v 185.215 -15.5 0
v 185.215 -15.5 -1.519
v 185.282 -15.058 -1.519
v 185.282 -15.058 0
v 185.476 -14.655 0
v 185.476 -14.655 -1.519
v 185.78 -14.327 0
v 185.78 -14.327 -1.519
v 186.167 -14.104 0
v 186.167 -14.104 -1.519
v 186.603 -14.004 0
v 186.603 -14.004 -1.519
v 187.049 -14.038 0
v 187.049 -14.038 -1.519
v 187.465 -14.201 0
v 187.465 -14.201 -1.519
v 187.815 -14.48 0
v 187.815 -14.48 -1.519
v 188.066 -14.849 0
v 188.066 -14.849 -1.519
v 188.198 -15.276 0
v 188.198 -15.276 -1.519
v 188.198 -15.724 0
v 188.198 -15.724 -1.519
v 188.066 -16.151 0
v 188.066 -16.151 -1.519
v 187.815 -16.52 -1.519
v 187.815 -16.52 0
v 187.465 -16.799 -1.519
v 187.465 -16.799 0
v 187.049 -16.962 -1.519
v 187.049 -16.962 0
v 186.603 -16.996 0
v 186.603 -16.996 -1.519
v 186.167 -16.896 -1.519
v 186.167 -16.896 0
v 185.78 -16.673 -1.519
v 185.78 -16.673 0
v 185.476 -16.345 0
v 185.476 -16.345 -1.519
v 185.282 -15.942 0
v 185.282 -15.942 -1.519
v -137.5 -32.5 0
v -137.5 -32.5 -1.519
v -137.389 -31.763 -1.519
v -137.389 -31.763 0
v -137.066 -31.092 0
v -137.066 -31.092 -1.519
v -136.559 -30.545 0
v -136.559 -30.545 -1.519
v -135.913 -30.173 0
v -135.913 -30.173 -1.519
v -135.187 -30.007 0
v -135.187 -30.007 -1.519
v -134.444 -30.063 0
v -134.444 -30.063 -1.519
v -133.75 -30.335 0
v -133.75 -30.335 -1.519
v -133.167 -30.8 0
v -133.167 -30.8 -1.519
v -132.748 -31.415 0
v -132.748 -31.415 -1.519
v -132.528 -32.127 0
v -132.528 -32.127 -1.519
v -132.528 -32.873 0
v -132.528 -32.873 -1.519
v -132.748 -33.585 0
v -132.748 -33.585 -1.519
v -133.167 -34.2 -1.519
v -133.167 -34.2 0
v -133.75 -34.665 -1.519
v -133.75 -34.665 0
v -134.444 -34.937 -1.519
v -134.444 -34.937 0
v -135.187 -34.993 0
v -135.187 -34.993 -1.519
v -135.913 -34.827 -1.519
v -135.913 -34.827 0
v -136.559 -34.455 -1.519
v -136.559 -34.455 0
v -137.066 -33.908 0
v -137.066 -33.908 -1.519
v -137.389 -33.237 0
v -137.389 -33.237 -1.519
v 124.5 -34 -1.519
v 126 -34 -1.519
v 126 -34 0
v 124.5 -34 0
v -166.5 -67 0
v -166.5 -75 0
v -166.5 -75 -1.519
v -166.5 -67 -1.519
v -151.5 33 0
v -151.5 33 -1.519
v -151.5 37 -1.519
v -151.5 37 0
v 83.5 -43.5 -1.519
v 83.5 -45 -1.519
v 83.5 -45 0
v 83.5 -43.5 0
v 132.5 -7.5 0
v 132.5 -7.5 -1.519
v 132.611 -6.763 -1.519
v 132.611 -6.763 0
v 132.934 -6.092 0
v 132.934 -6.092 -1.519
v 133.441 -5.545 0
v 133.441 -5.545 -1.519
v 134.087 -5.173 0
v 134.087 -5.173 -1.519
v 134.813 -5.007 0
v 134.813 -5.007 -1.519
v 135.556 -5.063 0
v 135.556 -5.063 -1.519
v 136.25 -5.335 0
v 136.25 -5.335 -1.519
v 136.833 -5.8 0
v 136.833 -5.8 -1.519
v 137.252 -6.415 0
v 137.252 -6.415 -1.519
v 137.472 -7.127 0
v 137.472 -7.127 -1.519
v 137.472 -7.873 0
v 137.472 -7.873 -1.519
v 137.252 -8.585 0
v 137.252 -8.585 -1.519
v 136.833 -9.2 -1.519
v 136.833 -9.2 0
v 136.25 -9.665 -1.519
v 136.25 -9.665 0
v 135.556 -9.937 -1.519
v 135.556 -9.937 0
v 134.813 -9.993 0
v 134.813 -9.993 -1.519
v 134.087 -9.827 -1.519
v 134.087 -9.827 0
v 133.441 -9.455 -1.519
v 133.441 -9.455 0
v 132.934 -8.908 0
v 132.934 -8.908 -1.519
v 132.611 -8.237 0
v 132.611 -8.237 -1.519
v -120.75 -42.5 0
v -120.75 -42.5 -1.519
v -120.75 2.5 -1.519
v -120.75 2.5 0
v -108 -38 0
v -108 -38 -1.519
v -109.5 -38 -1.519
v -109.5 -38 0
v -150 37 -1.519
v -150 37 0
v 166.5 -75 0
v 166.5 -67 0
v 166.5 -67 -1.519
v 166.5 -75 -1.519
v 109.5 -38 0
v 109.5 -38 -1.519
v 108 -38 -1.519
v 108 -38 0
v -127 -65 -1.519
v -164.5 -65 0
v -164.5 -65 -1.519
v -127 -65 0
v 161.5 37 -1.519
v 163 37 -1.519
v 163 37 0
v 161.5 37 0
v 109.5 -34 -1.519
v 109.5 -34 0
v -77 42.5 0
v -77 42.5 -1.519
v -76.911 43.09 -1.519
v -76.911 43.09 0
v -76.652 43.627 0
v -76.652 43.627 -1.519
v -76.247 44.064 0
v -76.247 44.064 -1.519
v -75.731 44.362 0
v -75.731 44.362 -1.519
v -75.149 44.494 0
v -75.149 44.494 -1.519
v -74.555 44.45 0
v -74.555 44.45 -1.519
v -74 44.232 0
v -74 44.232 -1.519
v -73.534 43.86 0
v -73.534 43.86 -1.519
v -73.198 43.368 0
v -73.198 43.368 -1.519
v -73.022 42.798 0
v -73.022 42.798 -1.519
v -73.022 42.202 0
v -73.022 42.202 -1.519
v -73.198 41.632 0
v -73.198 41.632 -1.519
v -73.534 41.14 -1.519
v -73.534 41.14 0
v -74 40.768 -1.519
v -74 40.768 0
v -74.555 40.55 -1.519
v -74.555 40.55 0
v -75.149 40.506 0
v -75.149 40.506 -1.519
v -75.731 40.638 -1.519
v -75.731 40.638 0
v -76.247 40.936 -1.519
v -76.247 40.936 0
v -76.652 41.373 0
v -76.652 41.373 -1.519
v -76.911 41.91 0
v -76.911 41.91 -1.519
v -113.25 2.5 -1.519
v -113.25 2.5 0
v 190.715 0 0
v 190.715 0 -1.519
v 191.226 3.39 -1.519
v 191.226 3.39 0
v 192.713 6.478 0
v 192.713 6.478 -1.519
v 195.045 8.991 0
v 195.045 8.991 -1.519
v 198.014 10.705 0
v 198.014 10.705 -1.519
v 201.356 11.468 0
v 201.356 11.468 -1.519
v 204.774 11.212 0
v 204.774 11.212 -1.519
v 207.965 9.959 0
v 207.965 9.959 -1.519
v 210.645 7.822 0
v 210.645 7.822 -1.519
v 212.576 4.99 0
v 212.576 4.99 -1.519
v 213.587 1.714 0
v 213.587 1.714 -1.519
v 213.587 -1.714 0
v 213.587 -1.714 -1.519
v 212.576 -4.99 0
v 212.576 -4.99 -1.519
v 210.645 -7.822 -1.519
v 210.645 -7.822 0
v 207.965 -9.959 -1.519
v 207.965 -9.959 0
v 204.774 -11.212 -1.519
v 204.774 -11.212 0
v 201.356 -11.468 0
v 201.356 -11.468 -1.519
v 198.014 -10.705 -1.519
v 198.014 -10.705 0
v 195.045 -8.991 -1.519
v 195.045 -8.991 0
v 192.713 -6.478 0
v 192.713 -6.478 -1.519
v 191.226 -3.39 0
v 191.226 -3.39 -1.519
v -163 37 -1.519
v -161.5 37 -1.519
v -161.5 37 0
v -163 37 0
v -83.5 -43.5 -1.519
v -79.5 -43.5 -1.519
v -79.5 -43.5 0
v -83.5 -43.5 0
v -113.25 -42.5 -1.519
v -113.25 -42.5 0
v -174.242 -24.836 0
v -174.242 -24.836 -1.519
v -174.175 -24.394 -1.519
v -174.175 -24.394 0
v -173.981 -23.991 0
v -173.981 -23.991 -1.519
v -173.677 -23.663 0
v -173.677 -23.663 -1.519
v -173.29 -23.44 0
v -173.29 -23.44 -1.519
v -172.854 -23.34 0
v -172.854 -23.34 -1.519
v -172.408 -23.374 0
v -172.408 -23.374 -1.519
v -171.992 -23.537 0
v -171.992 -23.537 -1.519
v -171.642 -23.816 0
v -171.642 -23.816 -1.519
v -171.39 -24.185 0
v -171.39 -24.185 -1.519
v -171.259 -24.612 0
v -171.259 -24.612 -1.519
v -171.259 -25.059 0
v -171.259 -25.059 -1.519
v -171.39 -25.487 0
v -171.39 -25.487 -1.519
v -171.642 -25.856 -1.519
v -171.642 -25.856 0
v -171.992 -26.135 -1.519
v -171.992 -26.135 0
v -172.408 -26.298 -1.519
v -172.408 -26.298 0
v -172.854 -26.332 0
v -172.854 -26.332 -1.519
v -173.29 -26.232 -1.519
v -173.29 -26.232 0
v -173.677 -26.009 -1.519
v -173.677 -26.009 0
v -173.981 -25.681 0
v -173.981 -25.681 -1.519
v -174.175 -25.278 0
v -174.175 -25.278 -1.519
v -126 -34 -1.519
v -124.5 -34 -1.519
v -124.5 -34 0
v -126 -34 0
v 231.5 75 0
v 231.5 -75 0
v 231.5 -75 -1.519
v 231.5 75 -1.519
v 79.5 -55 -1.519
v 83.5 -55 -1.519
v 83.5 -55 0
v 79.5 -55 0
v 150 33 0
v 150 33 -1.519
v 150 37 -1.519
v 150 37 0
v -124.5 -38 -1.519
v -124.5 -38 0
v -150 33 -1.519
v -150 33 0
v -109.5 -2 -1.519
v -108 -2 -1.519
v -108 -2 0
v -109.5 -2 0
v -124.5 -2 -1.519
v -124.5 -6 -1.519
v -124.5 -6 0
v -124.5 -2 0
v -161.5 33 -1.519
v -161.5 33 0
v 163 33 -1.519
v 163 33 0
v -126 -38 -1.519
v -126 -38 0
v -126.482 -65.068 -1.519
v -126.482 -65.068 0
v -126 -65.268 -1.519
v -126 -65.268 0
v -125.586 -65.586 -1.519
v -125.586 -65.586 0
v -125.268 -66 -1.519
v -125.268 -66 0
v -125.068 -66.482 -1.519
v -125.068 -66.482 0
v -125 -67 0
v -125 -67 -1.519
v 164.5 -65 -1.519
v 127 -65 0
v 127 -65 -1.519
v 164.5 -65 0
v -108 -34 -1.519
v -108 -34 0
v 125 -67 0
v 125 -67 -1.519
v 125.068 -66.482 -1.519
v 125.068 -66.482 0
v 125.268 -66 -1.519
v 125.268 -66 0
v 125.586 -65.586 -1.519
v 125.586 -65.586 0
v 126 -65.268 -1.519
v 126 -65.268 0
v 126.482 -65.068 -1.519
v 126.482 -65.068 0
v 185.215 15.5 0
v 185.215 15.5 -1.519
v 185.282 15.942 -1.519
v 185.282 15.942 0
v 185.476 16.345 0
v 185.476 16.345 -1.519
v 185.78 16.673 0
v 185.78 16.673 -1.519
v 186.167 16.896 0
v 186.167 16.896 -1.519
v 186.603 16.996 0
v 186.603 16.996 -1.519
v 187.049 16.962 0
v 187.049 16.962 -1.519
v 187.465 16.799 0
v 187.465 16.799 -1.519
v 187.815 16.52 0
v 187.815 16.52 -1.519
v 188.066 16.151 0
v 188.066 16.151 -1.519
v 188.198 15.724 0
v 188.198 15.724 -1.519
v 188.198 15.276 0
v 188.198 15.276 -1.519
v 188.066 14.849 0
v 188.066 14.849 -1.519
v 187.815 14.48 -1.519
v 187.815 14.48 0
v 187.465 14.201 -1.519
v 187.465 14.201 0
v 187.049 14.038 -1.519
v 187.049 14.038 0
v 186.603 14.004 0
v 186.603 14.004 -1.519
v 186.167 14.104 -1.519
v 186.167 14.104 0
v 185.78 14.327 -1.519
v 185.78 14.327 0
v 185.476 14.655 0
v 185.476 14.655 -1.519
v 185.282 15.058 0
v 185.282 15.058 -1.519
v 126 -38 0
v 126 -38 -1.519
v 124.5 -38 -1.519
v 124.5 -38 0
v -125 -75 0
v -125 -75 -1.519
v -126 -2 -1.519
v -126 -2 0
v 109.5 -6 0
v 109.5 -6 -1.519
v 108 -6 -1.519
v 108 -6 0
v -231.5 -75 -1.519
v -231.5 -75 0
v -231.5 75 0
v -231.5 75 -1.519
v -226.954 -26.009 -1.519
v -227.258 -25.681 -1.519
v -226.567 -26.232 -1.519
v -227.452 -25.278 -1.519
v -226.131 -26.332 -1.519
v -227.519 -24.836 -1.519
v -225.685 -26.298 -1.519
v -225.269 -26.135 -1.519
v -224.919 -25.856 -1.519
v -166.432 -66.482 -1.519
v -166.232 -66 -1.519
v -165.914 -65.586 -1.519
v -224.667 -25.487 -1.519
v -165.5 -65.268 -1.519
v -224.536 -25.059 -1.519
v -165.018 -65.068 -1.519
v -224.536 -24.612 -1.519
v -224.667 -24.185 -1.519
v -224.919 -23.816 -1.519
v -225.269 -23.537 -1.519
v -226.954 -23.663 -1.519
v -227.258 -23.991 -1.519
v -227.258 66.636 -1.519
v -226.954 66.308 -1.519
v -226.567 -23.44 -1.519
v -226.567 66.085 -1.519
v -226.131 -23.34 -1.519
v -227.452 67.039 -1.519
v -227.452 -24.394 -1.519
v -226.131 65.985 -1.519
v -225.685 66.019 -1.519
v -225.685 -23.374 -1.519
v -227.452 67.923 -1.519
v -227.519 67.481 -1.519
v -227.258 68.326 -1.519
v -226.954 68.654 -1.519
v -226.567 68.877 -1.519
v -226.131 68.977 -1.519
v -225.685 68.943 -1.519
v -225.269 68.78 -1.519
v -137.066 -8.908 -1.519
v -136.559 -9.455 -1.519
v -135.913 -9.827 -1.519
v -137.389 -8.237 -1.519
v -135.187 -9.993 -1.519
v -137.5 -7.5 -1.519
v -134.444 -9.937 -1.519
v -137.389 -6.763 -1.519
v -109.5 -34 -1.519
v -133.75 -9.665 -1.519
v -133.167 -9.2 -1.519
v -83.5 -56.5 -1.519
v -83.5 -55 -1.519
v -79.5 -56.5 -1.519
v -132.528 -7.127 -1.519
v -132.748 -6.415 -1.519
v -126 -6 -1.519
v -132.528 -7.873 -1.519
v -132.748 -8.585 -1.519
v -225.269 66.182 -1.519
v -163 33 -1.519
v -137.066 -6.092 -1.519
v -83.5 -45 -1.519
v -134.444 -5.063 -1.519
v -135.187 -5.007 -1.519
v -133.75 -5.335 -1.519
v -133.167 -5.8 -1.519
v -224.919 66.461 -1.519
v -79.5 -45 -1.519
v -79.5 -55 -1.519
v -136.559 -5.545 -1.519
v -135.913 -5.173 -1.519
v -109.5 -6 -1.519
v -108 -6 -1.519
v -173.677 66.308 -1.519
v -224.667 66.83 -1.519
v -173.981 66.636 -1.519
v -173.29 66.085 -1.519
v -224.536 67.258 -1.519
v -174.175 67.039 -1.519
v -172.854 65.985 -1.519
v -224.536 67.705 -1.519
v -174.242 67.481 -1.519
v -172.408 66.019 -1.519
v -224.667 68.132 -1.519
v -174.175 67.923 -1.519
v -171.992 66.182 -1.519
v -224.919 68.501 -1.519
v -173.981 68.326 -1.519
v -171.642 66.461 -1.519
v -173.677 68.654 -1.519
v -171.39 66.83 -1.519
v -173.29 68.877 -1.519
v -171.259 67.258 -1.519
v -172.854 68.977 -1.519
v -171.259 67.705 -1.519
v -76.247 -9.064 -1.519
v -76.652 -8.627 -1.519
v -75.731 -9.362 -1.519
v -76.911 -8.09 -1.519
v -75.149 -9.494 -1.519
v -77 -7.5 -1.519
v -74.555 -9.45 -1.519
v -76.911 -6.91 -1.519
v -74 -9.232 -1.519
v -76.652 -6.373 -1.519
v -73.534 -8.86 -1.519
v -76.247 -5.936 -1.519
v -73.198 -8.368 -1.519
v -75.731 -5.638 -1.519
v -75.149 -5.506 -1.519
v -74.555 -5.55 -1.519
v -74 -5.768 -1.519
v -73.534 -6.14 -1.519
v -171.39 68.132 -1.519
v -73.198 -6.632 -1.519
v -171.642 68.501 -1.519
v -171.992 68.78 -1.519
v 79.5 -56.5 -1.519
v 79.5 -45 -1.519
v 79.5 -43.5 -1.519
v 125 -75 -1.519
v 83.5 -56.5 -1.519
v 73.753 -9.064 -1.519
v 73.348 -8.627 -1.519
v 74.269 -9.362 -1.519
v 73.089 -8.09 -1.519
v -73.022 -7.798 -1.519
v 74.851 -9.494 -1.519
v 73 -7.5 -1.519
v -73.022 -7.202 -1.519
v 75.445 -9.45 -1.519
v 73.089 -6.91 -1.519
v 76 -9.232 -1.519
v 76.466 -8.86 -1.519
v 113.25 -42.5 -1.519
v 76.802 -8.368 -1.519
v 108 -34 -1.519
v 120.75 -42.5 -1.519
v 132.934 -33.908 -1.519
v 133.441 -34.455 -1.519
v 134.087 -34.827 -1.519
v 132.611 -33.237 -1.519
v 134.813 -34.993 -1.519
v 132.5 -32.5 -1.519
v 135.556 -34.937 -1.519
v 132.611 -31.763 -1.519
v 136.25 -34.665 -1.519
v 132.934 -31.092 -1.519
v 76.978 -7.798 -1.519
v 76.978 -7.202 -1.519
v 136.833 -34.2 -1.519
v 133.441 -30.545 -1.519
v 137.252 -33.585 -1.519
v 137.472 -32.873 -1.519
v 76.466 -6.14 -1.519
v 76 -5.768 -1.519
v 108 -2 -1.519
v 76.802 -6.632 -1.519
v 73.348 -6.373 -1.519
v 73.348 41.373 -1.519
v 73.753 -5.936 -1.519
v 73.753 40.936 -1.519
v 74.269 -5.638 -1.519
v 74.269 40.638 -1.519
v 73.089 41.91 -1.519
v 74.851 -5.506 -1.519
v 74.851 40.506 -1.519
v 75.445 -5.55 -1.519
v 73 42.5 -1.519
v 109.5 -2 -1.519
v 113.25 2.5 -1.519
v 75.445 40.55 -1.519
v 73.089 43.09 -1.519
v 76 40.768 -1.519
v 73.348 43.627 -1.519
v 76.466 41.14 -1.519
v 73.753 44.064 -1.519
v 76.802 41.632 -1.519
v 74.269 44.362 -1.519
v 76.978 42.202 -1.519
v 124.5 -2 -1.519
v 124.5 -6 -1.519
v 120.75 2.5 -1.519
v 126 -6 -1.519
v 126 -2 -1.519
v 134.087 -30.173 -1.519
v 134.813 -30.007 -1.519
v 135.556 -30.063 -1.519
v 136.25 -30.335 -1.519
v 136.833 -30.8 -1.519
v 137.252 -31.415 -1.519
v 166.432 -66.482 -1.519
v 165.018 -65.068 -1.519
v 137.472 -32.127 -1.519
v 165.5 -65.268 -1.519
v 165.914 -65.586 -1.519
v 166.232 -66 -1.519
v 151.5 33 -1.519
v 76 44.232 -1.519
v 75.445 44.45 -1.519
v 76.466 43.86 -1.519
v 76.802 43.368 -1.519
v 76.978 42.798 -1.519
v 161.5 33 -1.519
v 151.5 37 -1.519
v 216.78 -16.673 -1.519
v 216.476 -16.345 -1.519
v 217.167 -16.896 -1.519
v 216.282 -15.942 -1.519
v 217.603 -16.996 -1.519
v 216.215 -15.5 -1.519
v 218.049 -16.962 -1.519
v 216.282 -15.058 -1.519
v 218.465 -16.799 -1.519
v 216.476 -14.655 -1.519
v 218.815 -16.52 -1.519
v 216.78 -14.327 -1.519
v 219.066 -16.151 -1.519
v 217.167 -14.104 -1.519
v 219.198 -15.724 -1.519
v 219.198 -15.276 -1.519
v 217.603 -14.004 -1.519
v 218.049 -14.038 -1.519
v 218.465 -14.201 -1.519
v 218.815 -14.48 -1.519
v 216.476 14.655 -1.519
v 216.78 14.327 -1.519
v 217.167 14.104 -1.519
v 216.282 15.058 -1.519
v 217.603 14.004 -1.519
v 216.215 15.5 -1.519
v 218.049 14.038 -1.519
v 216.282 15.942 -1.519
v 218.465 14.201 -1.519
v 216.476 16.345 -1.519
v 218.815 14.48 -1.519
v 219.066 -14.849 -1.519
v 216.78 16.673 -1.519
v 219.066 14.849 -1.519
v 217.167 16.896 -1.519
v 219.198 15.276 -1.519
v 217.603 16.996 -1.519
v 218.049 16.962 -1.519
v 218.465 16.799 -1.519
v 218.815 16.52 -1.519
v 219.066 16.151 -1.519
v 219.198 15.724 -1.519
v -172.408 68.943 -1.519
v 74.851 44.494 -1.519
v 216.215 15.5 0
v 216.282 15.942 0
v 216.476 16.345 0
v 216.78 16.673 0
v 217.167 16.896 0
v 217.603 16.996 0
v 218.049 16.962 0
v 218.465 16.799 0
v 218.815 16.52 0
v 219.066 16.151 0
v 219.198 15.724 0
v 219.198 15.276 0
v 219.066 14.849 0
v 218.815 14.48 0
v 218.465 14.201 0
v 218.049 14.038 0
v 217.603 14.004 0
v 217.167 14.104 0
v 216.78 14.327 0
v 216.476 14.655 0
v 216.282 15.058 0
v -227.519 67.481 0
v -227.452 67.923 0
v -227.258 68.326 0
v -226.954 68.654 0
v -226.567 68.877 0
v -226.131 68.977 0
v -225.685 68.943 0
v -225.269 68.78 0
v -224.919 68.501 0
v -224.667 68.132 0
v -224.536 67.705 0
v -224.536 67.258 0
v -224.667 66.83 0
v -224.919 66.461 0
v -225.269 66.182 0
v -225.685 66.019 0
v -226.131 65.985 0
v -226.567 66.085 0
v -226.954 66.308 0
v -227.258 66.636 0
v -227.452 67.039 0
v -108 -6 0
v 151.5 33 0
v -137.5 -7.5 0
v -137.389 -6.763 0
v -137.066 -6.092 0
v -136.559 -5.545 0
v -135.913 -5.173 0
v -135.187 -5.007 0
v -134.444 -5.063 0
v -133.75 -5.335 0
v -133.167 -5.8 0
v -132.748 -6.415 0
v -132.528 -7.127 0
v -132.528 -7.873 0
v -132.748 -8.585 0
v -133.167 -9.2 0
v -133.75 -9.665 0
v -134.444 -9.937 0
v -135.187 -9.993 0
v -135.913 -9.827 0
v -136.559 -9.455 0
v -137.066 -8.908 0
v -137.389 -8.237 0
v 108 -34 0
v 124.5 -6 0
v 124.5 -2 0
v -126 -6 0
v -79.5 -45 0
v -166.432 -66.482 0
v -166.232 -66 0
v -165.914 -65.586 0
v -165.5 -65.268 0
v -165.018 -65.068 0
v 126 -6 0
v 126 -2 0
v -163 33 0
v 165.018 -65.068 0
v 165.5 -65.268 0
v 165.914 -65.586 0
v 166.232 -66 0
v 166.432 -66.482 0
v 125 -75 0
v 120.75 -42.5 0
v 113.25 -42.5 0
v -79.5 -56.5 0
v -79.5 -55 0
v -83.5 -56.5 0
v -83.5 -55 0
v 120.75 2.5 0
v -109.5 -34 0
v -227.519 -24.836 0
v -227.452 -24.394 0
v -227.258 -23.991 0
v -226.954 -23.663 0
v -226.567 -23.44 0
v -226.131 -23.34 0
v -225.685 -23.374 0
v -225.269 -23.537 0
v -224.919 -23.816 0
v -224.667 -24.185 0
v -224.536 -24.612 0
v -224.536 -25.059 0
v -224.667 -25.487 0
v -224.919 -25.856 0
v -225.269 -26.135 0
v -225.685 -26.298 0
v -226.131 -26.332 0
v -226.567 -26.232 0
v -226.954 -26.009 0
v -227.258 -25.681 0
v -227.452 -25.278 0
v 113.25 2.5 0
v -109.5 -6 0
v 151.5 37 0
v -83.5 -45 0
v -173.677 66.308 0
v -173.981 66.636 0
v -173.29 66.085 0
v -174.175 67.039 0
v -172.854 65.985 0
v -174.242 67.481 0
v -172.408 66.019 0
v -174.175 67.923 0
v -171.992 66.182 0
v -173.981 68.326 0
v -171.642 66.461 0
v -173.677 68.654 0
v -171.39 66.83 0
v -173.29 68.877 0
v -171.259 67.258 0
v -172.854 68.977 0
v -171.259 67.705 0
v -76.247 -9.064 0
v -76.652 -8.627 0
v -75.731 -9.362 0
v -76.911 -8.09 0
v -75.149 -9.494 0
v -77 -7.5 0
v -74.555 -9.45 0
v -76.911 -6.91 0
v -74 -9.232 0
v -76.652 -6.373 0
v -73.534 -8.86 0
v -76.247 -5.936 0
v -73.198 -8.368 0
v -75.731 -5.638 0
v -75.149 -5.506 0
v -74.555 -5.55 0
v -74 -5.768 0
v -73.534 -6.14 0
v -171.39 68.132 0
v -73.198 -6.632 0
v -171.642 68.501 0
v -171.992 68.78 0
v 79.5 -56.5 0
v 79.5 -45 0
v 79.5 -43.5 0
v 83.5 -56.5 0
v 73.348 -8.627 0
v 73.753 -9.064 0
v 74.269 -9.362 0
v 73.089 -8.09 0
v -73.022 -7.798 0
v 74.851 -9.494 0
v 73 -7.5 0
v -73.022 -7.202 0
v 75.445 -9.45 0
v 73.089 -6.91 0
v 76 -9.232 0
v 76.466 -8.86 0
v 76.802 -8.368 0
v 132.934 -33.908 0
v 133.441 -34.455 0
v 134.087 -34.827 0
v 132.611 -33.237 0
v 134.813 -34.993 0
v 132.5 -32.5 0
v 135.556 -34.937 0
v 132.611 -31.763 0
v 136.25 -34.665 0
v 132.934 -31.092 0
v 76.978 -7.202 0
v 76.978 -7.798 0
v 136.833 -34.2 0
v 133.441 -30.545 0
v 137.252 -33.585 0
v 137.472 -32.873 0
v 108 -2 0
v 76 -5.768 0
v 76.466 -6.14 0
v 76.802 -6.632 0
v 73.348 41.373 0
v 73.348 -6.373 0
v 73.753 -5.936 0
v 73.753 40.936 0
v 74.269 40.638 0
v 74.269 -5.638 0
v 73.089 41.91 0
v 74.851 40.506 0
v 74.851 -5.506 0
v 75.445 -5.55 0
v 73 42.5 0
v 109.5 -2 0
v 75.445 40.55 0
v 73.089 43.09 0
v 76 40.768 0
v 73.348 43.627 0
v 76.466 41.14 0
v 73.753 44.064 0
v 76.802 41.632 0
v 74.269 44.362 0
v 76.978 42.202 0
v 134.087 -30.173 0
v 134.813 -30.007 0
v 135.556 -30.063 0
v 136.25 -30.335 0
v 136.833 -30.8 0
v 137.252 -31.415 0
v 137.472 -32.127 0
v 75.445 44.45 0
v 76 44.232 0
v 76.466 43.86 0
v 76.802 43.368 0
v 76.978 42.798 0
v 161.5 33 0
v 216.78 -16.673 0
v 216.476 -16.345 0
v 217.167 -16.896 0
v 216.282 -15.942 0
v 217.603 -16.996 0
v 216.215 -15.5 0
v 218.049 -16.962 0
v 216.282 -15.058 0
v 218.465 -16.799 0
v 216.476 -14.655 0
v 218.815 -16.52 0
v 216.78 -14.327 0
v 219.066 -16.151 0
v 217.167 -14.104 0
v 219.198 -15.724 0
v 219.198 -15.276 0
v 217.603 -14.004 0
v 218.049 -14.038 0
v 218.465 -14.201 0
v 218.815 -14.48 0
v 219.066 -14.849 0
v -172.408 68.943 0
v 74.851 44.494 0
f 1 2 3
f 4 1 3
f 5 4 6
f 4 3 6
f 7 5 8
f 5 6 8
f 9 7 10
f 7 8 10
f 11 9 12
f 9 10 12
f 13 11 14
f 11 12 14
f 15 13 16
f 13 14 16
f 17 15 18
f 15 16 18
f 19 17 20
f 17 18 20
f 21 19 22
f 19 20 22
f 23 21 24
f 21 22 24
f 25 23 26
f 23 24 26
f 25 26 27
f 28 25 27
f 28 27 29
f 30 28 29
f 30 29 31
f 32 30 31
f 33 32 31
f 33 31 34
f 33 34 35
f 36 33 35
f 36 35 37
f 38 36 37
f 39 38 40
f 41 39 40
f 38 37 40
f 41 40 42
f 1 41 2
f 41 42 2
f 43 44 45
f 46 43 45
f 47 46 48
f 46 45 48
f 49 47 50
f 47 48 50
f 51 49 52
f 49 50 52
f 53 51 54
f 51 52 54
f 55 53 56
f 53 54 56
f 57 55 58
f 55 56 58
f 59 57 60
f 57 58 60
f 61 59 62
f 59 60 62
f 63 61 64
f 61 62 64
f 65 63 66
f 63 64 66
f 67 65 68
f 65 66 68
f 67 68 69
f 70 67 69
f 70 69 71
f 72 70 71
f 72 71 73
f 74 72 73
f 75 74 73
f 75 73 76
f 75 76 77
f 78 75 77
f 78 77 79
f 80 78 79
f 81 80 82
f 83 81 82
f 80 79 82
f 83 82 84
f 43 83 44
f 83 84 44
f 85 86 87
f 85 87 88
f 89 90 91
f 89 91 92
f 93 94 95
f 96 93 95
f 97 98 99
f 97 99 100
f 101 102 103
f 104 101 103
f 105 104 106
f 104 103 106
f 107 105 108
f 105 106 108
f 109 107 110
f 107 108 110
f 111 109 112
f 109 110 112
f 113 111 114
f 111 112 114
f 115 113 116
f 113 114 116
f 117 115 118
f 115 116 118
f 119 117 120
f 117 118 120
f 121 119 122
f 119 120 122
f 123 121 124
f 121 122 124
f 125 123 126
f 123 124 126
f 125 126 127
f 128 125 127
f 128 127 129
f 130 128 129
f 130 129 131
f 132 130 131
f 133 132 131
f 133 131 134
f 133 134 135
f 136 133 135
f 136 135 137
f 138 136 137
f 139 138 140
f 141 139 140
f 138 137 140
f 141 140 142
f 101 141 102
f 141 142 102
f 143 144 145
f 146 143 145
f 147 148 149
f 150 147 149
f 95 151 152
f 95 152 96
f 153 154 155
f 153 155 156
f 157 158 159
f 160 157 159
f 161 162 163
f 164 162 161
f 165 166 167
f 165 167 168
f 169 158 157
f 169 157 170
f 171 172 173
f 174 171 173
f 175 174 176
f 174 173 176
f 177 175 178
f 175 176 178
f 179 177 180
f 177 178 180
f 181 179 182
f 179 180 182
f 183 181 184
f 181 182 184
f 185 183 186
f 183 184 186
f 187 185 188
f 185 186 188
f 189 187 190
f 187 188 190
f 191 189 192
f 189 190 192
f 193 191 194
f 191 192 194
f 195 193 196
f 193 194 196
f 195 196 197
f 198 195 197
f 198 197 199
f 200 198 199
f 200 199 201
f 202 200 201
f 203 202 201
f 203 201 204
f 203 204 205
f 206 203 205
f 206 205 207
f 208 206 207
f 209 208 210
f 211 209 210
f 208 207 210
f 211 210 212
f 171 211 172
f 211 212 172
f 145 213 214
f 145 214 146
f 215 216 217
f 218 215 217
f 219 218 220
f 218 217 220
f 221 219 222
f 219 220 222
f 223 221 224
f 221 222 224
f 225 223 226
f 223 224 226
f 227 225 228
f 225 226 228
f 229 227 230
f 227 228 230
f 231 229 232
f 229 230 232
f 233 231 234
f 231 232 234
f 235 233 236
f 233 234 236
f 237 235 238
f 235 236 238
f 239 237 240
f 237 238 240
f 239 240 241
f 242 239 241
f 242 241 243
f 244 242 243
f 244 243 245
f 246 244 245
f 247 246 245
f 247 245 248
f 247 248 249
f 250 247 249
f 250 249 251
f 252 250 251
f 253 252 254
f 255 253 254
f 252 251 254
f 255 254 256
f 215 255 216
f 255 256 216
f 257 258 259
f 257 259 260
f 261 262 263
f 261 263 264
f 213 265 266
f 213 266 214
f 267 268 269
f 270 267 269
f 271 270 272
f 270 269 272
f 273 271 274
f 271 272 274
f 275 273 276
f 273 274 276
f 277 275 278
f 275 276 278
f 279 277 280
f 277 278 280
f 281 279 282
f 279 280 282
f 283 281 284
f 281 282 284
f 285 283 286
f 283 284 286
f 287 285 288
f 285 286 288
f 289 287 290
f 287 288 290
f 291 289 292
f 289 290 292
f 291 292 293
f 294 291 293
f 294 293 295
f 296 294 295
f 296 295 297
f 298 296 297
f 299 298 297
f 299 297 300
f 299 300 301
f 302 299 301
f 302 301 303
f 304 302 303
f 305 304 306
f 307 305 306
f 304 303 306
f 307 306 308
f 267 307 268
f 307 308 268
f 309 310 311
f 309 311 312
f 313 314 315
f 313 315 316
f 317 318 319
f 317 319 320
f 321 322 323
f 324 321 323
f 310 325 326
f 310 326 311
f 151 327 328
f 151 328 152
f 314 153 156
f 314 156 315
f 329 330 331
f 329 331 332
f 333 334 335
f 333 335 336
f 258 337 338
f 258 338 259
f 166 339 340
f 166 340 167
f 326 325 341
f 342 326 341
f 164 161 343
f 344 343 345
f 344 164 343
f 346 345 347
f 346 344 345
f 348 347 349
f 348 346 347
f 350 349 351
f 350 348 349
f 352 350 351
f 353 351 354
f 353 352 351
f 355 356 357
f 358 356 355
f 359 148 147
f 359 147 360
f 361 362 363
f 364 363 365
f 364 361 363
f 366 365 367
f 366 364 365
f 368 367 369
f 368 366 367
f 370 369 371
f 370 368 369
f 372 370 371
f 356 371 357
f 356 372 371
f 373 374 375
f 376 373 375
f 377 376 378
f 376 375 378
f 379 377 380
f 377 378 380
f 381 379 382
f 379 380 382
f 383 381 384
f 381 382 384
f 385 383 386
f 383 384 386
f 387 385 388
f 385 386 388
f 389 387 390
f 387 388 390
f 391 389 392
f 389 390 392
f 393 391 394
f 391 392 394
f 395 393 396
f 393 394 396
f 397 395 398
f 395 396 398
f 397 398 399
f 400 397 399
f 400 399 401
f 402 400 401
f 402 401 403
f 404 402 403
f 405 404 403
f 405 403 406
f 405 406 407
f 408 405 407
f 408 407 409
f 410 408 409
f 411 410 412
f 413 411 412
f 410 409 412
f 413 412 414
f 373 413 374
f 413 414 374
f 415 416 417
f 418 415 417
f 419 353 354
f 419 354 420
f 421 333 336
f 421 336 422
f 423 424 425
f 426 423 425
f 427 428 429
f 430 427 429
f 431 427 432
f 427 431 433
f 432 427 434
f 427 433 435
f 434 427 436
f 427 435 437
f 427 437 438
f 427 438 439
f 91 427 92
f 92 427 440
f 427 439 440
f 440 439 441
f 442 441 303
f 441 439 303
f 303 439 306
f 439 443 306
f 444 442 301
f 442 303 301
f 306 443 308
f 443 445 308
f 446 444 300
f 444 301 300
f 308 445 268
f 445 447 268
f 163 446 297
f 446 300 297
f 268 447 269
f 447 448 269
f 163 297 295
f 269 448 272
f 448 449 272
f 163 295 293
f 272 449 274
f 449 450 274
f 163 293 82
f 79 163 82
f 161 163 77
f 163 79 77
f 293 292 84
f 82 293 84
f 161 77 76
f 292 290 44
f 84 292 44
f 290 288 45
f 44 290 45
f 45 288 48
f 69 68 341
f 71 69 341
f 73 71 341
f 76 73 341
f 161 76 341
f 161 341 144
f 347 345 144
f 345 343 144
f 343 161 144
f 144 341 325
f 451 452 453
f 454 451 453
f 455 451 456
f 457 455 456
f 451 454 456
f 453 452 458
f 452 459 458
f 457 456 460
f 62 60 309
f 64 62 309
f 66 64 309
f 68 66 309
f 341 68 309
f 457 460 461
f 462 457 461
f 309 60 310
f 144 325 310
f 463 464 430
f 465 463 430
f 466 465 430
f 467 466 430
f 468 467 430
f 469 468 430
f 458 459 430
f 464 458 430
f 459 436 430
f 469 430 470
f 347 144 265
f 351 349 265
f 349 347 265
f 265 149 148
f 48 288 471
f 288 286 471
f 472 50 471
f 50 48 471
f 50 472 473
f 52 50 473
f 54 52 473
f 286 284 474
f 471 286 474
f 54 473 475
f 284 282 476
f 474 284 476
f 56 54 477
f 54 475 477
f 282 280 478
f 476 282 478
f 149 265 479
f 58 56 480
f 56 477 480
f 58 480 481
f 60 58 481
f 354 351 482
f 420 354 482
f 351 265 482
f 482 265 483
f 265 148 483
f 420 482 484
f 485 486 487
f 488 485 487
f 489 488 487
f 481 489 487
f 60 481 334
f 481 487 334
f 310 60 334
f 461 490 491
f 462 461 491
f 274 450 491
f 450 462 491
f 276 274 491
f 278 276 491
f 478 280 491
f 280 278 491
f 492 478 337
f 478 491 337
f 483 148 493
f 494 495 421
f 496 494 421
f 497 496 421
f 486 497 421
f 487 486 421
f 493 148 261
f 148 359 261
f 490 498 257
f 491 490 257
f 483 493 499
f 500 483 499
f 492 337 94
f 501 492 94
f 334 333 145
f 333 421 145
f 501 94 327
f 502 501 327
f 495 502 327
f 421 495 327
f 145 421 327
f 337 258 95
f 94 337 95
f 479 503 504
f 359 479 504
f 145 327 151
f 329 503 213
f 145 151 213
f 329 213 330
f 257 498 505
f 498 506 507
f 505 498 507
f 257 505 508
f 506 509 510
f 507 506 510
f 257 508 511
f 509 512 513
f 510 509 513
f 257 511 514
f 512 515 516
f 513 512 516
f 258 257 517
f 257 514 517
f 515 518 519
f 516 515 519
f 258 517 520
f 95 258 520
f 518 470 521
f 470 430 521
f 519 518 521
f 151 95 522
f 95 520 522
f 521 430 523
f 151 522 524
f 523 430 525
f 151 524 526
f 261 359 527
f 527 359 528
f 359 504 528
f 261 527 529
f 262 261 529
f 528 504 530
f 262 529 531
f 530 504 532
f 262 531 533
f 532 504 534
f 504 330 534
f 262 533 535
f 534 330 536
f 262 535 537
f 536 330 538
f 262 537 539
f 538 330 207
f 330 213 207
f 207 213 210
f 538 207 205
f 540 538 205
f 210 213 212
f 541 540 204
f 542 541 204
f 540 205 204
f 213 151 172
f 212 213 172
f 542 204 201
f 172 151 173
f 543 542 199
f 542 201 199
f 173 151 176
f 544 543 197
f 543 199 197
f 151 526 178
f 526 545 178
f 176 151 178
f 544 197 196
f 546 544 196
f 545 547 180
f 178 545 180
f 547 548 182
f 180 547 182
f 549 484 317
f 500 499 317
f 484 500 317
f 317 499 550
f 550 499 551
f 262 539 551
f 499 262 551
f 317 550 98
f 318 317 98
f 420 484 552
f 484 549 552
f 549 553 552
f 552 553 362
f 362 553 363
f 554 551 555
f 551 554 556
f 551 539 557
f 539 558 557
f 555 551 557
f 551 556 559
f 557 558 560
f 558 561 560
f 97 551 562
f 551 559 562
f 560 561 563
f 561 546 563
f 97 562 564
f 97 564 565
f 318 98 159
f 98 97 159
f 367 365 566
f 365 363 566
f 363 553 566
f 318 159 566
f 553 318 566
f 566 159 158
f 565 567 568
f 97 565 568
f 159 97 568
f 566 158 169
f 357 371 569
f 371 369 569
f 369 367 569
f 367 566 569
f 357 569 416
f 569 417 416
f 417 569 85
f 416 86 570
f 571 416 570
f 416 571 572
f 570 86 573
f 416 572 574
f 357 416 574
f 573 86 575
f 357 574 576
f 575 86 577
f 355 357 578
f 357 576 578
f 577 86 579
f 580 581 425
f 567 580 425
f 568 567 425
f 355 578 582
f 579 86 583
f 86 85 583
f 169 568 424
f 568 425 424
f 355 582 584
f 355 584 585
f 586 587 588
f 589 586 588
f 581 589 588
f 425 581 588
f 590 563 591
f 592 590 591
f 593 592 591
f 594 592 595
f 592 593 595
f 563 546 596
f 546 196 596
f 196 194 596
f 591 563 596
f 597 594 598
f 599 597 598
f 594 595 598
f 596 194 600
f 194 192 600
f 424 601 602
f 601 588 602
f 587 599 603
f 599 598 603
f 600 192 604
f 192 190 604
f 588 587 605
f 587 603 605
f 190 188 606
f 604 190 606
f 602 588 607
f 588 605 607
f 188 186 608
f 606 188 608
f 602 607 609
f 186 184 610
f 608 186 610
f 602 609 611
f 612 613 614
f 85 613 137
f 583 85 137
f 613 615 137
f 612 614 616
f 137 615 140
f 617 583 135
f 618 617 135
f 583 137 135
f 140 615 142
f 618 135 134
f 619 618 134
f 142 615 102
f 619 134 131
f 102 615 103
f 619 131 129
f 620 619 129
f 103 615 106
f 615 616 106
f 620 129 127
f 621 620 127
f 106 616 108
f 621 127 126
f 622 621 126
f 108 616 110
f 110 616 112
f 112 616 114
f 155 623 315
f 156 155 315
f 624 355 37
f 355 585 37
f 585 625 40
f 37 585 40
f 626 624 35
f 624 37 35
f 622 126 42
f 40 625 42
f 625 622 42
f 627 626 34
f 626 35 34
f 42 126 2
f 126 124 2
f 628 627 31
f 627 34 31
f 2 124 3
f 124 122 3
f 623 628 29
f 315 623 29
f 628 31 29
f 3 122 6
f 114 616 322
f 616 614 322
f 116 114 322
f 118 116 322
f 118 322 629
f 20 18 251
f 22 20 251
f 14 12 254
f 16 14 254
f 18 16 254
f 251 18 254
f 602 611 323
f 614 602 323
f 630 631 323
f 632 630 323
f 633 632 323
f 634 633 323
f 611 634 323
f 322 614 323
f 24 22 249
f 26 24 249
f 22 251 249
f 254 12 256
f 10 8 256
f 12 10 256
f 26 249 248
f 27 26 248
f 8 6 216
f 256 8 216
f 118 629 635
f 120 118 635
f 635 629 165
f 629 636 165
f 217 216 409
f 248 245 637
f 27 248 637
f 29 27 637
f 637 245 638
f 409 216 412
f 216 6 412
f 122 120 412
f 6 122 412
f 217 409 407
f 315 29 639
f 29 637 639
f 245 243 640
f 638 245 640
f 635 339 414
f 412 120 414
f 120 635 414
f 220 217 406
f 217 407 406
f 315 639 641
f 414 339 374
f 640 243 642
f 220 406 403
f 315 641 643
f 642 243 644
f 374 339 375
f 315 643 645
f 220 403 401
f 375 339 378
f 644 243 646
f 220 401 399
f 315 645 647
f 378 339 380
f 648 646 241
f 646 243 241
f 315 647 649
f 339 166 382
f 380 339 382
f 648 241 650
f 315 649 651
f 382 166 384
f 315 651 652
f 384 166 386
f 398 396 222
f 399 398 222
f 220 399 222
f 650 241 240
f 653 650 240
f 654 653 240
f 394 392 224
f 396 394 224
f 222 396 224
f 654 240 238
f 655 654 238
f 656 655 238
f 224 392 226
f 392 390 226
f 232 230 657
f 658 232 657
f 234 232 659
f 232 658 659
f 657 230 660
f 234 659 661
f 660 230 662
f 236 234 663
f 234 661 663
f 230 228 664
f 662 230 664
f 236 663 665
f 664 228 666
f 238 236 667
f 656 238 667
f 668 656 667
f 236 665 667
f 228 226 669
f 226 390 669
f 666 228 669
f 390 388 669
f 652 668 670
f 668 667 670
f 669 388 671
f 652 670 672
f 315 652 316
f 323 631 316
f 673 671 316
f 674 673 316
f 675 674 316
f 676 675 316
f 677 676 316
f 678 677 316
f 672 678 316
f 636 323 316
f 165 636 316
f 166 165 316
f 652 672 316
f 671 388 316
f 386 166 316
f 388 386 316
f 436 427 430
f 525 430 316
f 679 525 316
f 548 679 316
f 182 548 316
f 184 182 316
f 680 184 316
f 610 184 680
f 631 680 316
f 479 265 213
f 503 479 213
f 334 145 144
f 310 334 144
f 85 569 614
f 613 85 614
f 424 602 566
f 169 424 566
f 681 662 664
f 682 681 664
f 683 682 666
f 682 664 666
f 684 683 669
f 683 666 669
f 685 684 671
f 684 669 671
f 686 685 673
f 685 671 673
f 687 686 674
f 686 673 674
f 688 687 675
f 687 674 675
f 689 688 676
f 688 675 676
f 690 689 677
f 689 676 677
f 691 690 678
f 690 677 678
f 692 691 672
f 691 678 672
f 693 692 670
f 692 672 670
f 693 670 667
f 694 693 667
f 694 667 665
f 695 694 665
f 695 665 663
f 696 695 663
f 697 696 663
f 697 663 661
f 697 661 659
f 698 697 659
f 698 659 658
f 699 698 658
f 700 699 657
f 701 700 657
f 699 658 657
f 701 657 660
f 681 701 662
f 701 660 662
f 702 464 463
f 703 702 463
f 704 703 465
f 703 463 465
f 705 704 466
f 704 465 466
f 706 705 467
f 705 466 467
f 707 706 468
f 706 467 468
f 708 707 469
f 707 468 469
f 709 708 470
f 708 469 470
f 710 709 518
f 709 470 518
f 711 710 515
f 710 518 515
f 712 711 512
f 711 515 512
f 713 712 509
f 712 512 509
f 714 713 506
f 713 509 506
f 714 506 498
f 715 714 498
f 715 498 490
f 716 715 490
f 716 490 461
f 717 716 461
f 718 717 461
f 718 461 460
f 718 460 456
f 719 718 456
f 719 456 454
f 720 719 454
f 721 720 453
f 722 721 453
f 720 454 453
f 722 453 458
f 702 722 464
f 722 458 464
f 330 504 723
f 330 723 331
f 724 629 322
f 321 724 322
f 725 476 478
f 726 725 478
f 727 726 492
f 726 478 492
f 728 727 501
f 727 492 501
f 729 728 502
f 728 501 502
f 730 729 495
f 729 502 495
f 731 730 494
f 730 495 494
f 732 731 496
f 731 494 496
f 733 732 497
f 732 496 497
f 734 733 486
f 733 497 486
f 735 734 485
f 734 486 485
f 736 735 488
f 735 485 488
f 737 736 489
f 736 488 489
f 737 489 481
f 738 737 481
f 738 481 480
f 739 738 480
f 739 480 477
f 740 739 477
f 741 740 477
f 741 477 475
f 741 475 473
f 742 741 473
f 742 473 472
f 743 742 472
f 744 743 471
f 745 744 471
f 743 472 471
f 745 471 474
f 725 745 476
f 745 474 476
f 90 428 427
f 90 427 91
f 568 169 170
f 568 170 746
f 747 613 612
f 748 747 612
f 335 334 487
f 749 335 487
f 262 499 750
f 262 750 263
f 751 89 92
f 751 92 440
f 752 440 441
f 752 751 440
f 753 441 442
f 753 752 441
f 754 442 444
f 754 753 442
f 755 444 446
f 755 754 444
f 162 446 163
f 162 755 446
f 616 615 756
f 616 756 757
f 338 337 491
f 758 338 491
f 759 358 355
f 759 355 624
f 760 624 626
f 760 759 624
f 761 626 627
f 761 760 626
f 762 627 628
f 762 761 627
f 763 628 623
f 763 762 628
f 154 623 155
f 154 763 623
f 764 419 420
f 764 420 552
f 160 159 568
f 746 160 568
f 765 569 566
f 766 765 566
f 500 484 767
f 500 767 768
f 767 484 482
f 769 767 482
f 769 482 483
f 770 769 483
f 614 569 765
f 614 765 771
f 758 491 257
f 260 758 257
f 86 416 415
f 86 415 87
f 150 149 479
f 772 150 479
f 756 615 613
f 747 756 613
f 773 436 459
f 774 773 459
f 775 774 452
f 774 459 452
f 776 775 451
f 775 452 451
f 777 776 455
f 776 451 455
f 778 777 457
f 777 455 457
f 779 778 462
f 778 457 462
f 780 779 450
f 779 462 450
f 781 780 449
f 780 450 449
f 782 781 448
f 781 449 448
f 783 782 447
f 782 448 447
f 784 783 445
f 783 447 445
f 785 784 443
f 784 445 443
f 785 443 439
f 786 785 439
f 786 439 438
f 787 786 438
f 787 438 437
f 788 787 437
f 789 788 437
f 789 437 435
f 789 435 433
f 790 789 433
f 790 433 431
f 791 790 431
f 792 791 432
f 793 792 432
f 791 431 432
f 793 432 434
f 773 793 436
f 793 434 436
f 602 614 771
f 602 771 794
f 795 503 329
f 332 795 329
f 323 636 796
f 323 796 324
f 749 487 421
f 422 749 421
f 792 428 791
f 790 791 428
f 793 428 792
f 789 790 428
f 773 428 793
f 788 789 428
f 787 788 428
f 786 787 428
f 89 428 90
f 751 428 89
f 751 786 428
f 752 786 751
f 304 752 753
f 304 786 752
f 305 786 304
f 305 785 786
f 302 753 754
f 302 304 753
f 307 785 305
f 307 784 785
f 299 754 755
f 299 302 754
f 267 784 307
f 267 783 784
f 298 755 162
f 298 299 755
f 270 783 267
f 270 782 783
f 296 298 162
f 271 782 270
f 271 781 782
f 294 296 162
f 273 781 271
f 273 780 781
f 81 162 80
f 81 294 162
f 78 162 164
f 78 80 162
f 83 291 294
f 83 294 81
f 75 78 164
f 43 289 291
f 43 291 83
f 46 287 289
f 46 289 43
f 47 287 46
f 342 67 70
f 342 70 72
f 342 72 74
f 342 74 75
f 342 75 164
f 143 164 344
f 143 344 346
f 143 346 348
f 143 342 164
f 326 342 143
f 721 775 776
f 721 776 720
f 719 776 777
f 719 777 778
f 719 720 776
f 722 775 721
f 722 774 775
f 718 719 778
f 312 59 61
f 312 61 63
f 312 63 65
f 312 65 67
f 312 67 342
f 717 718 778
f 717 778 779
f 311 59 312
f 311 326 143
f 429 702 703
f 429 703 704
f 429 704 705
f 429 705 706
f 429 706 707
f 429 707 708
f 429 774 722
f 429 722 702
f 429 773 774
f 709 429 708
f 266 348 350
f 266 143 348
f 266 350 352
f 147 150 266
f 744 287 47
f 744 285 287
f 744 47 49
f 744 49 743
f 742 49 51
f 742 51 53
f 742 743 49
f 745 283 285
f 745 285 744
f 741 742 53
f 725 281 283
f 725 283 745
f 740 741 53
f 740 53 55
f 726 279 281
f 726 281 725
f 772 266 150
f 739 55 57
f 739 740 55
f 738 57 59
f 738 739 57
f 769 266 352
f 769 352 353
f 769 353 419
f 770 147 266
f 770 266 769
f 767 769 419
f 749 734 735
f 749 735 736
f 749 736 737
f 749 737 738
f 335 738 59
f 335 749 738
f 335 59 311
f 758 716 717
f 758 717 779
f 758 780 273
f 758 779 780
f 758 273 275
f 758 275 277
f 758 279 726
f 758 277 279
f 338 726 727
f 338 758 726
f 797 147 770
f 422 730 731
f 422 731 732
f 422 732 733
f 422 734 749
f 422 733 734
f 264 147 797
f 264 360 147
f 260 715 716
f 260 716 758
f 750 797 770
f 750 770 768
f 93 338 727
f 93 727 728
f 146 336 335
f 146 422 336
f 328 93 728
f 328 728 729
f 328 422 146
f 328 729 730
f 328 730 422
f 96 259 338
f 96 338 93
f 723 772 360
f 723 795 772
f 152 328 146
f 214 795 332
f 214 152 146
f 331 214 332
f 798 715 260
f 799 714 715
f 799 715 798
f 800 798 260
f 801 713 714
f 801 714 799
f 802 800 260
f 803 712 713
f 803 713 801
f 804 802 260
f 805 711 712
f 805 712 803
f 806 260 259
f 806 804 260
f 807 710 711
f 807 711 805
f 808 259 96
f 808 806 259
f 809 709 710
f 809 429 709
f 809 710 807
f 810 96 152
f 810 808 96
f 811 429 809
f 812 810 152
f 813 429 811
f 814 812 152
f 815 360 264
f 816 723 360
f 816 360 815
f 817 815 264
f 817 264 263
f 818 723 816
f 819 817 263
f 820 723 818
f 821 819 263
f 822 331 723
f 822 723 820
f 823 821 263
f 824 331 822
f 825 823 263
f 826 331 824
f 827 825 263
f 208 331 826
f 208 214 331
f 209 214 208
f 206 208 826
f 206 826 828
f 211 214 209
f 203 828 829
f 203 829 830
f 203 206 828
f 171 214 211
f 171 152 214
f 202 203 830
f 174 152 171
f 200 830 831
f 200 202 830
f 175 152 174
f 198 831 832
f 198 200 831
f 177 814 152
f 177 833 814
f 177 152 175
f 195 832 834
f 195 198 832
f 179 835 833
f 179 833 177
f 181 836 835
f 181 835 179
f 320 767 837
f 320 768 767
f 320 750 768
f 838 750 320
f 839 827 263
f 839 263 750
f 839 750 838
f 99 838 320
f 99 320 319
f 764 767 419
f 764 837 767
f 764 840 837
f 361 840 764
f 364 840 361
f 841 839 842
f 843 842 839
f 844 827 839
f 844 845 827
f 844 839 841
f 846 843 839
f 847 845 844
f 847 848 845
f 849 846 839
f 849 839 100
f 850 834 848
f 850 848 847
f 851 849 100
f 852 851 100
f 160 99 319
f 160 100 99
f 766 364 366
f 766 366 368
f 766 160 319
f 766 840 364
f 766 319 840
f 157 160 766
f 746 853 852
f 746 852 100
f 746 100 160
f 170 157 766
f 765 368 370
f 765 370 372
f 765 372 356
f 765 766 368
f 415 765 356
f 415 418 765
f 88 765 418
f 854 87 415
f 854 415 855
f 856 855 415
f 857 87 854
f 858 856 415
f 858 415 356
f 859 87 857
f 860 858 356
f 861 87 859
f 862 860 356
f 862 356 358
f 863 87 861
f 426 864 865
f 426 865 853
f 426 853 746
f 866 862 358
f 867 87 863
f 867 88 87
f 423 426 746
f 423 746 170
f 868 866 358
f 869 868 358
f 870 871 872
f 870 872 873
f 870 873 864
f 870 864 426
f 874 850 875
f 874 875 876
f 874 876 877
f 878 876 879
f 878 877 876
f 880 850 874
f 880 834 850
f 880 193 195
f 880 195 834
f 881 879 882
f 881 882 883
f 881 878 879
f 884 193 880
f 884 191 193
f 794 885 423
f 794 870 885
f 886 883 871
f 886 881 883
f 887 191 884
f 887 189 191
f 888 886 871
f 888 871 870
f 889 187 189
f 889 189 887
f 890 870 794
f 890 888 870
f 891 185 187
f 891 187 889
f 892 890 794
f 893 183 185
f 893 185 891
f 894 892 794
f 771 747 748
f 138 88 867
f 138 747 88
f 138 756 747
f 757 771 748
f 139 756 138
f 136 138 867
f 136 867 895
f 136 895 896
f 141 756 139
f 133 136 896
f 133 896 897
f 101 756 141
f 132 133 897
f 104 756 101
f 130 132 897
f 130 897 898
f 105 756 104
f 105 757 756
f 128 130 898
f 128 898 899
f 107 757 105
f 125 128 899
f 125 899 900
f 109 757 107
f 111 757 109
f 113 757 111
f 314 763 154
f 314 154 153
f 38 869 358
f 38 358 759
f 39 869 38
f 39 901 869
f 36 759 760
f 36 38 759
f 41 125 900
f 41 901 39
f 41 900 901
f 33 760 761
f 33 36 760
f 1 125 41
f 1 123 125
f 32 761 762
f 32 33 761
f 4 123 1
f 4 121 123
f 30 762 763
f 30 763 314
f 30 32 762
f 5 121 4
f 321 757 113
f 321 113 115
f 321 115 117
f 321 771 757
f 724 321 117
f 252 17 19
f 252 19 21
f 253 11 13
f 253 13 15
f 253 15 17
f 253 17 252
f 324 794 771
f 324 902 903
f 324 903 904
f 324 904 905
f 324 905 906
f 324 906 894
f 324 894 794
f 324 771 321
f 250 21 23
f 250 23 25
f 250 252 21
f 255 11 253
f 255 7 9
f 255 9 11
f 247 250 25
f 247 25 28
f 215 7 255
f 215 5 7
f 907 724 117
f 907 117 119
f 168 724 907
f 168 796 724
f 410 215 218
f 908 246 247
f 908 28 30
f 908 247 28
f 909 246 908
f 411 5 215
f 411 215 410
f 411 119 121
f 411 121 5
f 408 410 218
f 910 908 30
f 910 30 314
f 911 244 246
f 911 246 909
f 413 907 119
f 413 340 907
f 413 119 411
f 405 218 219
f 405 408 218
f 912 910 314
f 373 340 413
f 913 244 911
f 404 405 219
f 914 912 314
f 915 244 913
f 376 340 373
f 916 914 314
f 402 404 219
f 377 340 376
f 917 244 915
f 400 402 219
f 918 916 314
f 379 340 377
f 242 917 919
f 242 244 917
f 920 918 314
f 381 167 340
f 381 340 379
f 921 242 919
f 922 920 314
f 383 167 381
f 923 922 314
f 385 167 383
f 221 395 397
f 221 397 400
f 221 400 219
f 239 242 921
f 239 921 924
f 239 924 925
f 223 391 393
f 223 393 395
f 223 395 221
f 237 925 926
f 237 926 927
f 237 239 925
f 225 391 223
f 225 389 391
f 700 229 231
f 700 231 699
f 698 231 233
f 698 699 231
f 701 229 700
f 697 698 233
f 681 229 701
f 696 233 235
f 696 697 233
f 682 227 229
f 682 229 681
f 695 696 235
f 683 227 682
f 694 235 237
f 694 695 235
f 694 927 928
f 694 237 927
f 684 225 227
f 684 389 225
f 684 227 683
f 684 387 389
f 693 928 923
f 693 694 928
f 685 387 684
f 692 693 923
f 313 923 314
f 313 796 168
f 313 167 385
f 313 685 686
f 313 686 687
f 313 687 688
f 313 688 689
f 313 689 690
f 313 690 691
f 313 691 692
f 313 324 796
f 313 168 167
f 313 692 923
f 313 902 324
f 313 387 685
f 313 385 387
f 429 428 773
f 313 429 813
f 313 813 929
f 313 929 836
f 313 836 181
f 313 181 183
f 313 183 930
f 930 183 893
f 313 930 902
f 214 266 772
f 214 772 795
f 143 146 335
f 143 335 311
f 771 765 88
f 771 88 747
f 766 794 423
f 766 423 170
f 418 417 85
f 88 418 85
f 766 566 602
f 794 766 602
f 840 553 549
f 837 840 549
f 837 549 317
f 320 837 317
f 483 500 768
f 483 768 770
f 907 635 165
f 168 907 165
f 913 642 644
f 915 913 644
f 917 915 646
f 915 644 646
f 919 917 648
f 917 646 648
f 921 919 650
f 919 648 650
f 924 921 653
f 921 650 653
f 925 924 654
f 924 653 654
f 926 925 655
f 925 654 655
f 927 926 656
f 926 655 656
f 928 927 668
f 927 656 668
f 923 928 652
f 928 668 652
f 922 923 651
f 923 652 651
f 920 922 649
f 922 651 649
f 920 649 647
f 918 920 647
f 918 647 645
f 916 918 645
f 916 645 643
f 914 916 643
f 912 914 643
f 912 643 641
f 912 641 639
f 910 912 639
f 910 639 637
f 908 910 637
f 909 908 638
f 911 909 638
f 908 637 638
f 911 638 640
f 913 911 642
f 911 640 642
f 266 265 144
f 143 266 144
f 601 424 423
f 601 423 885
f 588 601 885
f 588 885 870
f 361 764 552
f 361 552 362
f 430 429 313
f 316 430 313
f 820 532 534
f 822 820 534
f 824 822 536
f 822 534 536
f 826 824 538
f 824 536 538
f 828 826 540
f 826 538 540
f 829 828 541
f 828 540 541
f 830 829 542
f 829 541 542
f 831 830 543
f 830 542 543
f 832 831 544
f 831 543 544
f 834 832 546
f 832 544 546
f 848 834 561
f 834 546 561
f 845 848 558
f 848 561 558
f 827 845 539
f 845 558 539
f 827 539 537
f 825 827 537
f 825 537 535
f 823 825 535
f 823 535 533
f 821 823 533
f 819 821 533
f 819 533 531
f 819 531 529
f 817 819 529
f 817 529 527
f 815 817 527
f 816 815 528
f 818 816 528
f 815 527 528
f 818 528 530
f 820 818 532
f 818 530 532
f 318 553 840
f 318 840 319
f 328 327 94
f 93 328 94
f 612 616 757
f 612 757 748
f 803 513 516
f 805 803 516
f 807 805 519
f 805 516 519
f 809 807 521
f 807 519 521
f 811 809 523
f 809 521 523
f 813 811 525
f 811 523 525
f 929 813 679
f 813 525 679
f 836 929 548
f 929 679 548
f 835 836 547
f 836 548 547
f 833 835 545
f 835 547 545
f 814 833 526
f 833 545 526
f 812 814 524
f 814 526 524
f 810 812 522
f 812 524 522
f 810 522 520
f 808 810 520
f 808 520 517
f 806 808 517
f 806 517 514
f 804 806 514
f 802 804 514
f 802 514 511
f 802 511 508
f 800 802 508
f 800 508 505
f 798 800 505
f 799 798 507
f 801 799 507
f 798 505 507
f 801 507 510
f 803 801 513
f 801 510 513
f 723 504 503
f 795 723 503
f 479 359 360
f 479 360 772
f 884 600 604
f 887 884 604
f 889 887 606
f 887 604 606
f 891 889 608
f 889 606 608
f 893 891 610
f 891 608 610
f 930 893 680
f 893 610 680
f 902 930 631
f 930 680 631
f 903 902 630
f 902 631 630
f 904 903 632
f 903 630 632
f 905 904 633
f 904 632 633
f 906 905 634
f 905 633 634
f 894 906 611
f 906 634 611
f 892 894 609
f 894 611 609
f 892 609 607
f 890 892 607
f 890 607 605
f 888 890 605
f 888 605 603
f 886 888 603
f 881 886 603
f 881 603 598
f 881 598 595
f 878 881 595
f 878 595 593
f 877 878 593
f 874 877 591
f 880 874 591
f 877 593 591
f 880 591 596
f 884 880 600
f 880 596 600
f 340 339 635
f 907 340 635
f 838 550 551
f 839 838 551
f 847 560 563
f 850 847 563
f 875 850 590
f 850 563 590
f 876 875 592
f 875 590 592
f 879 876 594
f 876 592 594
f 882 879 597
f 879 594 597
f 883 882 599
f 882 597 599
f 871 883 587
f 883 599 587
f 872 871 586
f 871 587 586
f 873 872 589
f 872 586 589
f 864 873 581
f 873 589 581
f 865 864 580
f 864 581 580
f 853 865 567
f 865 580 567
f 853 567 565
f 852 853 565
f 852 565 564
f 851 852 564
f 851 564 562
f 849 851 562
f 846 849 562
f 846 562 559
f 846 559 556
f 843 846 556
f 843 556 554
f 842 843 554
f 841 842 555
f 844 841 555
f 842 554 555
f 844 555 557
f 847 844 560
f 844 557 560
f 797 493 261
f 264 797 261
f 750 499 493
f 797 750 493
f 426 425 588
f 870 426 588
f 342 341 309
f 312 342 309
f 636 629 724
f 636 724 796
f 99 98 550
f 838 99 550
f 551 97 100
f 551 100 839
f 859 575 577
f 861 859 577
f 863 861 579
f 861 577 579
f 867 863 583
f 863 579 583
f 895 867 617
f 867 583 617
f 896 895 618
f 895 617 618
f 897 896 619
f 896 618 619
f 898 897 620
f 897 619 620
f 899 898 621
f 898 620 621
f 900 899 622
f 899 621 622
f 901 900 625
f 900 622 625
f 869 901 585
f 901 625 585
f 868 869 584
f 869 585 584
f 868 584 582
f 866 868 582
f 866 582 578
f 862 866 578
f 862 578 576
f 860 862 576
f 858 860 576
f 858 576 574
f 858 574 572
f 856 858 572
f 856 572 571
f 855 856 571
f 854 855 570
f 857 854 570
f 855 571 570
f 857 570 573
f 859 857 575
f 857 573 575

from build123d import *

# Parameters (mm, degrees)
SKETCH1_W          = 463
SKETCH1_H          = 150
BASE_FLANGE1_DEPTH = 1.51892
SKETCH48_R         = 1.5
SKETCH48_R_2       = 11.5
SKETCH48_R_3       = 2.5
SKETCH48_R_4       = 2
SKETCH48_W         = 7.5
SKETCH48_H         = 45
SKETCH48_W_2       = 1.5
SKETCH48_H_2       = 4
SKETCH48_W_3       = 4
SKETCH48_H_3       = 1.5
CUT_EXTRUDE1_DEPTH = 1.51892
CUT_EXTRUDE3_DEPTH = 10


# Sheet-metal steps are written as plain solids
with BuildPart() as part:
    # Sketch1 → Base-Flange1 (new body)
    with BuildSketch(Plane.XY):
        Rectangle(SKETCH1_W, SKETCH1_H)
    extrude(amount=-BASE_FLANGE1_DEPTH)

    # Sketch48 → Cut-Extrude1 (cut)
    with BuildSketch(Plane(origin=(0, 0, -1.51892), x_dir=(-1, 0, 0), z_dir=(0, 0, -1))):
        with Locations((-186.715, -15.5)):
            Circle(SKETCH48_R)
        with Locations((-186.715, 15.5)):
            Circle(SKETCH48_R)
        with Locations((-217.715, 15.5)):
            Circle(SKETCH48_R)
        with Locations((-202.215, 0)):
            Circle(SKETCH48_R_2)
        with Locations((-217.715, -15.5)):
            Circle(SKETCH48_R)
        with Locations((-135, -7.5)):
            Circle(SKETCH48_R_3)
        with Locations((-135, -32.5)):
            Circle(SKETCH48_R_3)
        with Locations((-75, -7.5)):
            Circle(SKETCH48_R_4)
        with Locations((-75, 42.5)):
            Circle(SKETCH48_R_4)
        with Locations((135, -32.5)):
            Circle(SKETCH48_R_3)
        with Locations((135, -7.5)):
            Circle(SKETCH48_R_3)
        with Locations((75, -7.5)):
            Circle(SKETCH48_R_4)
        with Locations((75, 42.5)):
            Circle(SKETCH48_R_4)
        with Locations((172.74192, -24.83591994)):
            Circle(SKETCH48_R)
        with Locations((226.01892, -24.83591994)):
            Circle(SKETCH48_R)
        with Locations((172.74192, 67.48108)):
            Circle(SKETCH48_R)
        with Locations((226.01892, 67.48108)):
            Circle(SKETCH48_R)
        with Locations((117, -20)):
            Rectangle(SKETCH48_W, SKETCH48_H)
        with Locations((-117, -20)):
            Rectangle(SKETCH48_W, SKETCH48_H)
        with Locations((-108.75, -4)):
            Rectangle(SKETCH48_W_2, SKETCH48_H_2)
        with Locations((-125.25, -4)):
            Rectangle(SKETCH48_W_2, SKETCH48_H_2)
        with Locations((-125.25, -36)):
            Rectangle(SKETCH48_W_2, SKETCH48_H_2)
        with Locations((-108.75, -36)):
            Rectangle(SKETCH48_W_2, SKETCH48_H_2)
        with Locations((-81.5, -44.25)):
            Rectangle(SKETCH48_W_3, SKETCH48_H_3)
        with Locations((-81.5, -55.75)):
            Rectangle(SKETCH48_W_3, SKETCH48_H_3)
        with Locations((-150.75, 35)):
            Rectangle(SKETCH48_W_2, SKETCH48_H_2)
        with Locations((-162.25, 35)):
            Rectangle(SKETCH48_W_2, SKETCH48_H_2)
        with Locations((125.25, -36)):
            Rectangle(SKETCH48_W_2, SKETCH48_H_2)
        with Locations((108.75, -36)):
            Rectangle(SKETCH48_W_2, SKETCH48_H_2)
        with Locations((81.5, -44.25)):
            Rectangle(SKETCH48_W_3, SKETCH48_H_3)
        with Locations((81.5, -55.75)):
            Rectangle(SKETCH48_W_3, SKETCH48_H_3)
        with Locations((162.25, 35)):
            Rectangle(SKETCH48_W_2, SKETCH48_H_2)
        with Locations((150.75, 35)):
            Rectangle(SKETCH48_W_2, SKETCH48_H_2)
        with Locations((108.75, -4)):
            Rectangle(SKETCH48_W_2, SKETCH48_H_2)
        with Locations((125.25, -4)):
            Rectangle(SKETCH48_W_2, SKETCH48_H_2)
    extrude(amount=-CUT_EXTRUDE1_DEPTH, mode=Mode.SUBTRACT)

    # Sketch50 → Cut-Extrude3 (cut)
    with BuildSketch(Plane.XY):
        with BuildLine():
            Line((166.5, -67), (166.5, -75))
            Line((166.5, -75), (125, -75))
            Line((125, -75), (125, -67))
            ThreePointArc((125, -67), (125.585786438, -65.585786438), (127, -65))
            Line((127, -65), (164.5, -65))
            ThreePointArc((164.5, -65), (165.914213562, -65.585786438), (166.5, -67))
        make_face()
        with BuildLine():
            Line((-125, -67), (-125, -75))
            Line((-125, -75), (-166.5, -75))
            Line((-166.5, -75), (-166.5, -67))
            ThreePointArc((-166.5, -67), (-165.914213562, -65.585786438), (-164.5, -65))
            Line((-164.5, -65), (-127, -65))
            ThreePointArc((-127, -65), (-125.585786438, -65.585786438), (-125, -67))
        make_face()
    extrude(amount=-CUT_EXTRUDE3_DEPTH, mode=Mode.SUBTRACT)


solid = part.part
